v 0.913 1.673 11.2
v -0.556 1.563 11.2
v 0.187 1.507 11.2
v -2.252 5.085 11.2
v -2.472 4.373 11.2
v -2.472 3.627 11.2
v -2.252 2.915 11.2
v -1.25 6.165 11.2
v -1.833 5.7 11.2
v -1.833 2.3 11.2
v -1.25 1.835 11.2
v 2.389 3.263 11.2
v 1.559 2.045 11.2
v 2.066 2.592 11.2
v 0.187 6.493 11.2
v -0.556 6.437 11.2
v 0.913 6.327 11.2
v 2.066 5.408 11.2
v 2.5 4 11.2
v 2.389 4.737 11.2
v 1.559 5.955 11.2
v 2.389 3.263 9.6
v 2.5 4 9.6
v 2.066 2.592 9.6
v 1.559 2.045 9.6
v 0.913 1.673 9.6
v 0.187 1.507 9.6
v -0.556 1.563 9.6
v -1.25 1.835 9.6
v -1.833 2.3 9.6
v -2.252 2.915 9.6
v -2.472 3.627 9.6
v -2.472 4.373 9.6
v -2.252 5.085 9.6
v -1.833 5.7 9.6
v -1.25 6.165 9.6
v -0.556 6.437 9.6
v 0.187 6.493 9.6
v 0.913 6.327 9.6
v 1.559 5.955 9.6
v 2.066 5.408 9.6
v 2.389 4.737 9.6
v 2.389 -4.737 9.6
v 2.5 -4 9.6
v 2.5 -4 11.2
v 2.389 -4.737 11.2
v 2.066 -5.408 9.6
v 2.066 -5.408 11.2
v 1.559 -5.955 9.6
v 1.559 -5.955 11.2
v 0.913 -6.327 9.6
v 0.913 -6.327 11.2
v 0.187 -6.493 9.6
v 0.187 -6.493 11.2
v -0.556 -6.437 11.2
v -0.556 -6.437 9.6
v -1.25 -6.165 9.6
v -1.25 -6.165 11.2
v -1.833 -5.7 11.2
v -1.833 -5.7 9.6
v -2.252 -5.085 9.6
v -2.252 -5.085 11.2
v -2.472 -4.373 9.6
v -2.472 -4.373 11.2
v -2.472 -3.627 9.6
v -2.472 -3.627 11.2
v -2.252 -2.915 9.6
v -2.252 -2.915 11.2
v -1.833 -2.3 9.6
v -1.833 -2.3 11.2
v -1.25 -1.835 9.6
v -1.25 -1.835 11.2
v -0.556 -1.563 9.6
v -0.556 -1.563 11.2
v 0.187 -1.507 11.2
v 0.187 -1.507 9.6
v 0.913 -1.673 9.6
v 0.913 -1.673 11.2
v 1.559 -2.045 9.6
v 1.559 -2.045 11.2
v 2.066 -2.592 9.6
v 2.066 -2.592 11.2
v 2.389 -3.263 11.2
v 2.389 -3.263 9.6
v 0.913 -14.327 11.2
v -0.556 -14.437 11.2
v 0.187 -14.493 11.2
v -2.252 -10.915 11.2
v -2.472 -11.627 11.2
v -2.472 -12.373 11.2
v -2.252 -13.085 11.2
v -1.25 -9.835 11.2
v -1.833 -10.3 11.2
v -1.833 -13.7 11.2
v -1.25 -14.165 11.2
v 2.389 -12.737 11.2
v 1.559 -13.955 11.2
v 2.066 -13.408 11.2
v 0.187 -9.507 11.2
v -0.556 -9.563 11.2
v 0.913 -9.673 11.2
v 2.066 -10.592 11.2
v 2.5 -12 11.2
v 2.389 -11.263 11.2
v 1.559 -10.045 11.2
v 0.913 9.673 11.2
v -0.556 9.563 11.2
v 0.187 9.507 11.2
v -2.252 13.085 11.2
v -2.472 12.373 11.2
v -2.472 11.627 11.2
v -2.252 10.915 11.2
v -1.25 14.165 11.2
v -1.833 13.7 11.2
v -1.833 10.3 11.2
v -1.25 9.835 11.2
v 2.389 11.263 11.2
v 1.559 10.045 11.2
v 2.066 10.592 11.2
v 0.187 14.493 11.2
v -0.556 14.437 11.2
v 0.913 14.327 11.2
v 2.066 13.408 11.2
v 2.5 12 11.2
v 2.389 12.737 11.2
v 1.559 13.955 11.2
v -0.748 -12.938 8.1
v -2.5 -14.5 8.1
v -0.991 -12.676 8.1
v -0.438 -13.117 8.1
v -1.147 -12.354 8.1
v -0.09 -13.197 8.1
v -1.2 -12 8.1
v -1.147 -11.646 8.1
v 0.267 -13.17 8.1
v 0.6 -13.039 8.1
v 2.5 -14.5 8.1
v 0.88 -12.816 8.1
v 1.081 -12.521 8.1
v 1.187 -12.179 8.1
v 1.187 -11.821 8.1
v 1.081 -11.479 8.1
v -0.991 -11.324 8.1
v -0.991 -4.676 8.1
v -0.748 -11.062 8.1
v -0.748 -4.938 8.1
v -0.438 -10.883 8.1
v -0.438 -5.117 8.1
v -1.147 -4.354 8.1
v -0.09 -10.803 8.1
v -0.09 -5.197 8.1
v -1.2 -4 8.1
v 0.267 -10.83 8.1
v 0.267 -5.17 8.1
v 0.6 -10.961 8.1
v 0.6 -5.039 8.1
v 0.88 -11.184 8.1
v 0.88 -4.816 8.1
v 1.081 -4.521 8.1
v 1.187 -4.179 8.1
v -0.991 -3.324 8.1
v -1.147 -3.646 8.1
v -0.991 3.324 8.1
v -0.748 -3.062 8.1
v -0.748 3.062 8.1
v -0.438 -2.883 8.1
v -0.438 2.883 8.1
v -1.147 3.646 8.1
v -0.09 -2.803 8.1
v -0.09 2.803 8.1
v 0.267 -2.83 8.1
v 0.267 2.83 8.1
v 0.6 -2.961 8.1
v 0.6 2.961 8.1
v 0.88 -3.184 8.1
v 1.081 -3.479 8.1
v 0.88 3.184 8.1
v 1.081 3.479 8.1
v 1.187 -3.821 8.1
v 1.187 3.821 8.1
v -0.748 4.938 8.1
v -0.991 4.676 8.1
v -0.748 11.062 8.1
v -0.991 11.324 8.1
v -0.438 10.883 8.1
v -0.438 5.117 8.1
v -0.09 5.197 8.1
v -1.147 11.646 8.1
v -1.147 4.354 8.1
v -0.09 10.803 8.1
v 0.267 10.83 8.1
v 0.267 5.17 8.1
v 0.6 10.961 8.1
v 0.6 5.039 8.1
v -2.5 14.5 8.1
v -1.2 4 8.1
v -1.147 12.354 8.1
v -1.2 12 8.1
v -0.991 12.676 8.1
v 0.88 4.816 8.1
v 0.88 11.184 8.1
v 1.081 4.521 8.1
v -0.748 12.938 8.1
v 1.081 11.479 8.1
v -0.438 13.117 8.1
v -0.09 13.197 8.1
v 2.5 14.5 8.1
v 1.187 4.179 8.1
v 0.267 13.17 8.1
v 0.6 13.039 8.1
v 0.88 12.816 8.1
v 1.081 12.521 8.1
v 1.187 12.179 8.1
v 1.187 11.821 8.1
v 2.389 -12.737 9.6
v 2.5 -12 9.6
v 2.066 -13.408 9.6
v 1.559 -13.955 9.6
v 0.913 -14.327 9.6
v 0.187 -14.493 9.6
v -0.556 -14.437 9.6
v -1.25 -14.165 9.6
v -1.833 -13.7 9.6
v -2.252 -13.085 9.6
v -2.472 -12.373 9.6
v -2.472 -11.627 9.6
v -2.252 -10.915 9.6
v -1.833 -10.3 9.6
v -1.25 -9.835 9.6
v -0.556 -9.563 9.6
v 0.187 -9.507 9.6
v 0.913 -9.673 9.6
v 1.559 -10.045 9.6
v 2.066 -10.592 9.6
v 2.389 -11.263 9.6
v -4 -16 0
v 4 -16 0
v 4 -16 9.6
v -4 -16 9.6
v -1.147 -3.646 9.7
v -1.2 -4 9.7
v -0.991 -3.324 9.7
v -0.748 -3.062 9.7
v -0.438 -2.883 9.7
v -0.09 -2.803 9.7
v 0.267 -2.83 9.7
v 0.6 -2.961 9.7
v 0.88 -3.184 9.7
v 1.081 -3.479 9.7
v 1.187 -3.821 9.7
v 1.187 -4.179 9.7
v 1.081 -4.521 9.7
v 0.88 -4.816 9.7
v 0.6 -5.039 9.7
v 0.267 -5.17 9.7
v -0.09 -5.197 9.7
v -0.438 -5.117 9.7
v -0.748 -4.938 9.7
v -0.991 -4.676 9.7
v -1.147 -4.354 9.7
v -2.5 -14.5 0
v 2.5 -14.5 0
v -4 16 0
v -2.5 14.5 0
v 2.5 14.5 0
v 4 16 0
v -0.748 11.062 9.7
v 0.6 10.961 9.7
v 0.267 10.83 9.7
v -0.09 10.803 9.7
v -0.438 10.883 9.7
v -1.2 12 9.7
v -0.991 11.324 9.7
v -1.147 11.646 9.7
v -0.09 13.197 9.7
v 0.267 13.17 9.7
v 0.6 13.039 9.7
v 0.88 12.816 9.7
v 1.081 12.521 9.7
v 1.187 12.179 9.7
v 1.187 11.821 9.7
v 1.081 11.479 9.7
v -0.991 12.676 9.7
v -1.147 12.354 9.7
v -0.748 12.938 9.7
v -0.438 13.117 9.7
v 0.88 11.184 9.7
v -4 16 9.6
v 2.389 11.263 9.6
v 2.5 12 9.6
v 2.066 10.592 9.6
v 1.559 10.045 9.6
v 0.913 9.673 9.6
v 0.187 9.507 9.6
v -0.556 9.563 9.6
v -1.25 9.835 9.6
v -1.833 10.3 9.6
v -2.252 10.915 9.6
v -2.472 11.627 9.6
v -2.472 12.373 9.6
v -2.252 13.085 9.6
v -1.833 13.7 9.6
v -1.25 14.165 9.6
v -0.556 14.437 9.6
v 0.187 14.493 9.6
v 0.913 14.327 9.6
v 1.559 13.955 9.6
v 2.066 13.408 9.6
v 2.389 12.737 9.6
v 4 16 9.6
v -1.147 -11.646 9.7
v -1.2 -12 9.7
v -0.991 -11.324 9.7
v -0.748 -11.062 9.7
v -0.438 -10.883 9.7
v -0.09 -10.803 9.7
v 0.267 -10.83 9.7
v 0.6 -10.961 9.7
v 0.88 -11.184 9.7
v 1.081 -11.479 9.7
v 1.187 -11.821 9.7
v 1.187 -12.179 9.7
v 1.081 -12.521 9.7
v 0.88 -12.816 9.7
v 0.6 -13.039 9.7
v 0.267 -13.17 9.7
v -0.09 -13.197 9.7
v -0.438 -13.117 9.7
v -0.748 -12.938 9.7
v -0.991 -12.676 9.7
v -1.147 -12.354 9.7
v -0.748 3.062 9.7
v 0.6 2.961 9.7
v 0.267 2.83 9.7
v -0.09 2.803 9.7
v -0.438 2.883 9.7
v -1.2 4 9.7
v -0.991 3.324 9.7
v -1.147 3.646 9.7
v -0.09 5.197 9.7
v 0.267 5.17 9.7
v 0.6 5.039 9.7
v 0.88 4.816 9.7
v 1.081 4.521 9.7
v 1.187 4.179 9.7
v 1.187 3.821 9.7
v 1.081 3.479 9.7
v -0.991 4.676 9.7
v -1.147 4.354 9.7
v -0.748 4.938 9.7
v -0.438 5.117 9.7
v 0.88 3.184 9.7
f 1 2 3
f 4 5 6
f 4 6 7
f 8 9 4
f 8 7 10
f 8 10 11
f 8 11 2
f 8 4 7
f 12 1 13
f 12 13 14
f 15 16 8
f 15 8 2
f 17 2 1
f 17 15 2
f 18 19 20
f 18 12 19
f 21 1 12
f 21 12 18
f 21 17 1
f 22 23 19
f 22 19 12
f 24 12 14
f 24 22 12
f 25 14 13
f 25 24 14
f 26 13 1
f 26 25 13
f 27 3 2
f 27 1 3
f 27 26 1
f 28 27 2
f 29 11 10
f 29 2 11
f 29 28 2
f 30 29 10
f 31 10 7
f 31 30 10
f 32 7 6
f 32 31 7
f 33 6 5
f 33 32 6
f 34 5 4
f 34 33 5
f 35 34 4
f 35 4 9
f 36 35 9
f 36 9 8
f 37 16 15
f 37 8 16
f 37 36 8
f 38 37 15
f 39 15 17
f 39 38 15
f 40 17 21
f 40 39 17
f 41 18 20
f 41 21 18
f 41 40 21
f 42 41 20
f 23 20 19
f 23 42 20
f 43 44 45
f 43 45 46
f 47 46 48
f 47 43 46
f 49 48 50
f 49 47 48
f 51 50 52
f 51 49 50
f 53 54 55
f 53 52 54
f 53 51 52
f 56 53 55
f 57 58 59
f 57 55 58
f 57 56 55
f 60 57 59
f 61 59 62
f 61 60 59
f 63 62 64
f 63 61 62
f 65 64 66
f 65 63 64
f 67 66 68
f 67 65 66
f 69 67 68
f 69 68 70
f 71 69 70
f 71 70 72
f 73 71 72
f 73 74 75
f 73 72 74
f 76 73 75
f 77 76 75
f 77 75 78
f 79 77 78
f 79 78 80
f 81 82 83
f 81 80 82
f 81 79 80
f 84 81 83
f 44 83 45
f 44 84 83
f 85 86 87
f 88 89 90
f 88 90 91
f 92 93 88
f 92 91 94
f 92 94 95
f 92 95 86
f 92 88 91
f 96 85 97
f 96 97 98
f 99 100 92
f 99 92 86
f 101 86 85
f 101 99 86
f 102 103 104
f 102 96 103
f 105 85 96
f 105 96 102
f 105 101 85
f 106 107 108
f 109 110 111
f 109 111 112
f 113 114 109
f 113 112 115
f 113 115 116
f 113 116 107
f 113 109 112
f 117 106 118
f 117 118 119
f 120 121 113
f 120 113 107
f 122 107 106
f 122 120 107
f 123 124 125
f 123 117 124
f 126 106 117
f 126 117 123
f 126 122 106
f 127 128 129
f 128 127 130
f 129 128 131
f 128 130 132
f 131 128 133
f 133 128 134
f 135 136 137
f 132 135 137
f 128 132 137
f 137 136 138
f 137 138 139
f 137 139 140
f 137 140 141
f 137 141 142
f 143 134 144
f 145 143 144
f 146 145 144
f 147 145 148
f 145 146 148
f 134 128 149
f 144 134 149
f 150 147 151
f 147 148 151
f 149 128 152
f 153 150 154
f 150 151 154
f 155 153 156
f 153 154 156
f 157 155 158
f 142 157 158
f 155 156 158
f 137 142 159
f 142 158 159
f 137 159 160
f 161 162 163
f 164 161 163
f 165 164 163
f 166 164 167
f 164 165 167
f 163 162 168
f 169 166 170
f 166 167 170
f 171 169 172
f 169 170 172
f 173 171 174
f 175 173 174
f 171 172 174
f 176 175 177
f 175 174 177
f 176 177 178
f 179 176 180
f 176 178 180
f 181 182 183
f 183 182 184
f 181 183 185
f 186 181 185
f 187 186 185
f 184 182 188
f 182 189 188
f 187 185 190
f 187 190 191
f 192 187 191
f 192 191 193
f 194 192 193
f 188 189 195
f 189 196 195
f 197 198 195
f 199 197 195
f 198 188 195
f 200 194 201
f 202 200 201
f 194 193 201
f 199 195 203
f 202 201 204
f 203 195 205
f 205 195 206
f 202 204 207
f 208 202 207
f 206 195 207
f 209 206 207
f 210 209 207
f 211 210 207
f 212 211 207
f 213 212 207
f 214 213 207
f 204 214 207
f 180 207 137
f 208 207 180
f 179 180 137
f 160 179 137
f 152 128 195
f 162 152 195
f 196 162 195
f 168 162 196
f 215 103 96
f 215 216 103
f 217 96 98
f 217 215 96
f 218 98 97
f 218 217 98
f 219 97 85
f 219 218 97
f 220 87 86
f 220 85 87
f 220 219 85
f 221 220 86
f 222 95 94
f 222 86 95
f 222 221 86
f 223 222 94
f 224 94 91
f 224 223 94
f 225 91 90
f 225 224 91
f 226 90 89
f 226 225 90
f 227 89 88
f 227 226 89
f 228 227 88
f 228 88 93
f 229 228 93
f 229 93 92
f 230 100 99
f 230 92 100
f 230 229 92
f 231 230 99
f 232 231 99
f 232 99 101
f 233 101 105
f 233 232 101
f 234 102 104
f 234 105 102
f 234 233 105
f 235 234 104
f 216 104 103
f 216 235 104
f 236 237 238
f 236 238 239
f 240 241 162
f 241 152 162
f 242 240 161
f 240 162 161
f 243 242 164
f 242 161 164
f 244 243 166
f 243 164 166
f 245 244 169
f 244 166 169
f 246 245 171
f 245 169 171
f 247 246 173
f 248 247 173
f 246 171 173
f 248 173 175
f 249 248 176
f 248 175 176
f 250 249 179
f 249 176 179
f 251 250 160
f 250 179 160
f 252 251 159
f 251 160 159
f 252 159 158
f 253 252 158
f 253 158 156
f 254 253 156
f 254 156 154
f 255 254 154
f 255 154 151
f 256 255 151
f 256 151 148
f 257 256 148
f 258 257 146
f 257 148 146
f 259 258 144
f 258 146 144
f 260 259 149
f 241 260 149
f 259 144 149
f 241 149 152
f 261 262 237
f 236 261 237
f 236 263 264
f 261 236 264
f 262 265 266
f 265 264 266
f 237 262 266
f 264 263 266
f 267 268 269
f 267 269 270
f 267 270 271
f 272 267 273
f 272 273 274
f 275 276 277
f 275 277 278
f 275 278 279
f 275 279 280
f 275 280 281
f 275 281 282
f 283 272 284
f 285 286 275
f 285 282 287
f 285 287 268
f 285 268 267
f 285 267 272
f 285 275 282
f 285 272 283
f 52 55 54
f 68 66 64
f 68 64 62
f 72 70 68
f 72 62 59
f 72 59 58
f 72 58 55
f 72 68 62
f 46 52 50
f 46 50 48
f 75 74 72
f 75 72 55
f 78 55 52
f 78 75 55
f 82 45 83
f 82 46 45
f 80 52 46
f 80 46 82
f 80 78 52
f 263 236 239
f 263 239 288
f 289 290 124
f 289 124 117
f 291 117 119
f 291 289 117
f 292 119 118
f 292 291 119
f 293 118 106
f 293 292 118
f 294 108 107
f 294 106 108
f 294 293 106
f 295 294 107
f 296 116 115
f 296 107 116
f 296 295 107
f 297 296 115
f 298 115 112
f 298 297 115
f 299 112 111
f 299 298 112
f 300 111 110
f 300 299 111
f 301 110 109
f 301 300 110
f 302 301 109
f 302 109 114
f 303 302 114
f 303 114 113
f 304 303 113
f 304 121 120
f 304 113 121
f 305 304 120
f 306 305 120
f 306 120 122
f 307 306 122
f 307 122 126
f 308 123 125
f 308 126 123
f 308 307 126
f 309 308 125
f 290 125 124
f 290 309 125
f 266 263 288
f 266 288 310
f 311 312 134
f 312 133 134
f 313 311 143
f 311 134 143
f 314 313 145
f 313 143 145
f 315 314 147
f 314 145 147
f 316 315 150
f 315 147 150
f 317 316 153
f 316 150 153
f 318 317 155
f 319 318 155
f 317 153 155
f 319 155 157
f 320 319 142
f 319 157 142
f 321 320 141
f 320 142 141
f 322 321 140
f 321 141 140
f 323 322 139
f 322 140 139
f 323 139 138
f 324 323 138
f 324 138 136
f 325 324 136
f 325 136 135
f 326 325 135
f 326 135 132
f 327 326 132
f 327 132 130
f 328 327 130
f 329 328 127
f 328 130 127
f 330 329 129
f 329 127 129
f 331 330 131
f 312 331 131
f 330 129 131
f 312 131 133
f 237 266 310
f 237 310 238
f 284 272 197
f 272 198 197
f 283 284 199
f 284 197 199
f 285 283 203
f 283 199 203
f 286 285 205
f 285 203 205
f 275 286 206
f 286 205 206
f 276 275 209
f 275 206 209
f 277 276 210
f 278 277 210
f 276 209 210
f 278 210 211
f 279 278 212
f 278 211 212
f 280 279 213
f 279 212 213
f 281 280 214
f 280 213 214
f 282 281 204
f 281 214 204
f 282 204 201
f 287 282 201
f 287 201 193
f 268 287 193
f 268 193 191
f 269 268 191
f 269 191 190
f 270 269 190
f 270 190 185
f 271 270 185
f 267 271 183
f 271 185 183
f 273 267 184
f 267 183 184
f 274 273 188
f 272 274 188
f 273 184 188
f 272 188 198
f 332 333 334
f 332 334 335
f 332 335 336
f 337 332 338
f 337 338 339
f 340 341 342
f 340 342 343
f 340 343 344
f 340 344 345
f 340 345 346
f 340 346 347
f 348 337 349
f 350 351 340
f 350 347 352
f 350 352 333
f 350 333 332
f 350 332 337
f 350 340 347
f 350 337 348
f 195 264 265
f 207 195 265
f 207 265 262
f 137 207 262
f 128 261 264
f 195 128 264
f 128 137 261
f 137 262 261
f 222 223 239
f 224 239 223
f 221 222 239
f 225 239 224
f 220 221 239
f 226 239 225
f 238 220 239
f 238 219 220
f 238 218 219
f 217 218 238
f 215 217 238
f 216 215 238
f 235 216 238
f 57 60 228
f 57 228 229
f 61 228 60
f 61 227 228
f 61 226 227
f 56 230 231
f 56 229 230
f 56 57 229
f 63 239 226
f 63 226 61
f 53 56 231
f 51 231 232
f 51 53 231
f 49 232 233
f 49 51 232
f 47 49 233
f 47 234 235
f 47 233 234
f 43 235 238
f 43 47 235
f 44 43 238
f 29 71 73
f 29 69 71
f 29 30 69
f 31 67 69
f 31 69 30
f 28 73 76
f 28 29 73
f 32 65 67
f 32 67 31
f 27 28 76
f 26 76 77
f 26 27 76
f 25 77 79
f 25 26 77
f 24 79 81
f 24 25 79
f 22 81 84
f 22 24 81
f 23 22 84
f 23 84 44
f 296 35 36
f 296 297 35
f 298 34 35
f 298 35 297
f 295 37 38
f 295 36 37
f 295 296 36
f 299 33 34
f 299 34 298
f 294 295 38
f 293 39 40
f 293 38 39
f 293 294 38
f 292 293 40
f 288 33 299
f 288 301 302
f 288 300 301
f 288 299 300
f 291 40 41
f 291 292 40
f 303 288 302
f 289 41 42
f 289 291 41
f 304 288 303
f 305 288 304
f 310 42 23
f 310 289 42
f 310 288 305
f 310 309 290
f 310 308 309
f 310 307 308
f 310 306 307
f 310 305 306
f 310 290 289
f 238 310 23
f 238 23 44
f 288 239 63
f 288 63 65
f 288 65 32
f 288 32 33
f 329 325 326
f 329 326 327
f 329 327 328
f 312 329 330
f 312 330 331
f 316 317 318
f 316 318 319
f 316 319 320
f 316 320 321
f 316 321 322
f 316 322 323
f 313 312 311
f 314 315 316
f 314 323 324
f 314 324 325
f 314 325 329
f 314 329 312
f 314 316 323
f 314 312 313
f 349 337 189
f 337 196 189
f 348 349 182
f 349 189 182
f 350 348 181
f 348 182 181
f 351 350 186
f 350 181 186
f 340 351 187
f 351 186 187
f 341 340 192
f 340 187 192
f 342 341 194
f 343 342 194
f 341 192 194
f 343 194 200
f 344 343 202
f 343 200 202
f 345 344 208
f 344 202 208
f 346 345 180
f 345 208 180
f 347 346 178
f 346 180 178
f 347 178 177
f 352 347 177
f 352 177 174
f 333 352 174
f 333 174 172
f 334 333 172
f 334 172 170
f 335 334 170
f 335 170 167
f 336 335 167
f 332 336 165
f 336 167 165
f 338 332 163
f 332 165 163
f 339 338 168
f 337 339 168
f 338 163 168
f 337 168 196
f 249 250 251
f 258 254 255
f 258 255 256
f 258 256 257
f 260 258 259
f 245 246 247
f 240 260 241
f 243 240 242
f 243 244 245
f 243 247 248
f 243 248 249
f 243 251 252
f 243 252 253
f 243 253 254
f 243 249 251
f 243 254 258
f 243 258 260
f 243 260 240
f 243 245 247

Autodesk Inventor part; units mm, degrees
ref_plane "YZ Plane" through (0, 0, 0) normal (1, 0, 0) x (0, 1, 0)
ref_plane "XZ Plane" through (0, 0, 0) normal (0, 1, 0) x (-1, 0, 0)
ref_plane "XY Plane" through (0, 0, 0) normal (0, 0, 1) x (1, 0, 0)
sketch "Sketch1" plane through (0, 0, 0) normal (0, 0, 1) x (1, 0, 0)
  line L0 (-4, 16) -> (4, 16)
  line L1 (4, 16) -> (4, -16)
  line L2 (4, -16) -> (-4, -16)
  line L3 (-4, -16) -> (-4, 16)
  point P0 (0, 0)
  dimension "d0" = 8
  dimension "d1" = 32
  dimension "d2" = 4
  dimension "d3" = 16
extrude "Extrusion1" add sketch "Sketch1" along normal blind 9.6
shell "Shell1" thickness 1.5 removed faces 1 at (-1.3333, 5.3333, 0)
sketch "Sketch2" plane through (0, 0, 9.6) normal (0, 0, 1) x (1, 0, 0)
  circle A0 centre (0, -12) radius 2.5
  line L0 (4, 16) -> (4, -16) projected
  line L1 (4, -16) -> (-4, -16) projected
  dimension "d7" = 5
  dimension "d10" = 4
  dimension "d11" = 4
extrude "Extrusion2" add sketch "Sketch2" along normal blind 1.6
sketch "Sketch3" plane through (2.5, -14.5, 8.1) normal (0, 0, -1) x (-1, 0, 0)
  circle A0 centre (2.5, 2.5) radius 2.5 projected
  circle A1 centre (2.5, 2.5) radius 1.2
  point P0 (2.5, 14.5)
  dimension "d18" = 2.4
extrude "Extrusion3" cut sketch "Sketch3" against normal blind 1.6 contours A1
pattern_linear "Rectangular Pattern1" count 4 spacing 8 along (0, 1, 0) of "Extrusion2", "Extrusion3"
sketch "Sketch4" plane through (2.5, -14.5, 8.1) normal (0, 0, -1) x (-1, 0, 0)
  circle A0 centre (2.5, 10.5) radius 1.2 projected
  circle A1 centre (2.5, 2.5) radius 1.2 projected
  line L0 (0, 29) -> (0, 0) projected
  line L1 (0, 0) -> (5, 0) projected
  circle A2 centre (6.5, 6.5) radius 3.15
  circle A3 centre (6.5, 6.5) radius 2.5
  point P0 (2.5, 14.5)
  dimension "d21" = 6.5
  dimension "d22" = 6.5
  dimension "d23" = 10.5
  dimension "d24" = 2.5
  dimension "d25" = 5
  dimension "d26" = 6.3
extrude "Extrusion4" [suppressed]
pattern_linear "Rectangular Pattern2" [suppressed]
equation "\"d0\" = 8 * WIDTH"
equation "\"d1\" = 8 * LENGTH"
equation "\"d2\" = 0.5 * d0"
equation "\"d3\" = 0.5 * d1"
equation "\"d4\" = HEIGHT"
equation "\"d21\" = 0.5 * d23 + 0.5 * d24"
equation "\"d22\" = d21"
equation "\"WIDTH\" = 1"
equation "\"HEIGHT\" = 9.6"
equation "\"LENGTH\" = 4"
properties part number "3010" material "Steel"
